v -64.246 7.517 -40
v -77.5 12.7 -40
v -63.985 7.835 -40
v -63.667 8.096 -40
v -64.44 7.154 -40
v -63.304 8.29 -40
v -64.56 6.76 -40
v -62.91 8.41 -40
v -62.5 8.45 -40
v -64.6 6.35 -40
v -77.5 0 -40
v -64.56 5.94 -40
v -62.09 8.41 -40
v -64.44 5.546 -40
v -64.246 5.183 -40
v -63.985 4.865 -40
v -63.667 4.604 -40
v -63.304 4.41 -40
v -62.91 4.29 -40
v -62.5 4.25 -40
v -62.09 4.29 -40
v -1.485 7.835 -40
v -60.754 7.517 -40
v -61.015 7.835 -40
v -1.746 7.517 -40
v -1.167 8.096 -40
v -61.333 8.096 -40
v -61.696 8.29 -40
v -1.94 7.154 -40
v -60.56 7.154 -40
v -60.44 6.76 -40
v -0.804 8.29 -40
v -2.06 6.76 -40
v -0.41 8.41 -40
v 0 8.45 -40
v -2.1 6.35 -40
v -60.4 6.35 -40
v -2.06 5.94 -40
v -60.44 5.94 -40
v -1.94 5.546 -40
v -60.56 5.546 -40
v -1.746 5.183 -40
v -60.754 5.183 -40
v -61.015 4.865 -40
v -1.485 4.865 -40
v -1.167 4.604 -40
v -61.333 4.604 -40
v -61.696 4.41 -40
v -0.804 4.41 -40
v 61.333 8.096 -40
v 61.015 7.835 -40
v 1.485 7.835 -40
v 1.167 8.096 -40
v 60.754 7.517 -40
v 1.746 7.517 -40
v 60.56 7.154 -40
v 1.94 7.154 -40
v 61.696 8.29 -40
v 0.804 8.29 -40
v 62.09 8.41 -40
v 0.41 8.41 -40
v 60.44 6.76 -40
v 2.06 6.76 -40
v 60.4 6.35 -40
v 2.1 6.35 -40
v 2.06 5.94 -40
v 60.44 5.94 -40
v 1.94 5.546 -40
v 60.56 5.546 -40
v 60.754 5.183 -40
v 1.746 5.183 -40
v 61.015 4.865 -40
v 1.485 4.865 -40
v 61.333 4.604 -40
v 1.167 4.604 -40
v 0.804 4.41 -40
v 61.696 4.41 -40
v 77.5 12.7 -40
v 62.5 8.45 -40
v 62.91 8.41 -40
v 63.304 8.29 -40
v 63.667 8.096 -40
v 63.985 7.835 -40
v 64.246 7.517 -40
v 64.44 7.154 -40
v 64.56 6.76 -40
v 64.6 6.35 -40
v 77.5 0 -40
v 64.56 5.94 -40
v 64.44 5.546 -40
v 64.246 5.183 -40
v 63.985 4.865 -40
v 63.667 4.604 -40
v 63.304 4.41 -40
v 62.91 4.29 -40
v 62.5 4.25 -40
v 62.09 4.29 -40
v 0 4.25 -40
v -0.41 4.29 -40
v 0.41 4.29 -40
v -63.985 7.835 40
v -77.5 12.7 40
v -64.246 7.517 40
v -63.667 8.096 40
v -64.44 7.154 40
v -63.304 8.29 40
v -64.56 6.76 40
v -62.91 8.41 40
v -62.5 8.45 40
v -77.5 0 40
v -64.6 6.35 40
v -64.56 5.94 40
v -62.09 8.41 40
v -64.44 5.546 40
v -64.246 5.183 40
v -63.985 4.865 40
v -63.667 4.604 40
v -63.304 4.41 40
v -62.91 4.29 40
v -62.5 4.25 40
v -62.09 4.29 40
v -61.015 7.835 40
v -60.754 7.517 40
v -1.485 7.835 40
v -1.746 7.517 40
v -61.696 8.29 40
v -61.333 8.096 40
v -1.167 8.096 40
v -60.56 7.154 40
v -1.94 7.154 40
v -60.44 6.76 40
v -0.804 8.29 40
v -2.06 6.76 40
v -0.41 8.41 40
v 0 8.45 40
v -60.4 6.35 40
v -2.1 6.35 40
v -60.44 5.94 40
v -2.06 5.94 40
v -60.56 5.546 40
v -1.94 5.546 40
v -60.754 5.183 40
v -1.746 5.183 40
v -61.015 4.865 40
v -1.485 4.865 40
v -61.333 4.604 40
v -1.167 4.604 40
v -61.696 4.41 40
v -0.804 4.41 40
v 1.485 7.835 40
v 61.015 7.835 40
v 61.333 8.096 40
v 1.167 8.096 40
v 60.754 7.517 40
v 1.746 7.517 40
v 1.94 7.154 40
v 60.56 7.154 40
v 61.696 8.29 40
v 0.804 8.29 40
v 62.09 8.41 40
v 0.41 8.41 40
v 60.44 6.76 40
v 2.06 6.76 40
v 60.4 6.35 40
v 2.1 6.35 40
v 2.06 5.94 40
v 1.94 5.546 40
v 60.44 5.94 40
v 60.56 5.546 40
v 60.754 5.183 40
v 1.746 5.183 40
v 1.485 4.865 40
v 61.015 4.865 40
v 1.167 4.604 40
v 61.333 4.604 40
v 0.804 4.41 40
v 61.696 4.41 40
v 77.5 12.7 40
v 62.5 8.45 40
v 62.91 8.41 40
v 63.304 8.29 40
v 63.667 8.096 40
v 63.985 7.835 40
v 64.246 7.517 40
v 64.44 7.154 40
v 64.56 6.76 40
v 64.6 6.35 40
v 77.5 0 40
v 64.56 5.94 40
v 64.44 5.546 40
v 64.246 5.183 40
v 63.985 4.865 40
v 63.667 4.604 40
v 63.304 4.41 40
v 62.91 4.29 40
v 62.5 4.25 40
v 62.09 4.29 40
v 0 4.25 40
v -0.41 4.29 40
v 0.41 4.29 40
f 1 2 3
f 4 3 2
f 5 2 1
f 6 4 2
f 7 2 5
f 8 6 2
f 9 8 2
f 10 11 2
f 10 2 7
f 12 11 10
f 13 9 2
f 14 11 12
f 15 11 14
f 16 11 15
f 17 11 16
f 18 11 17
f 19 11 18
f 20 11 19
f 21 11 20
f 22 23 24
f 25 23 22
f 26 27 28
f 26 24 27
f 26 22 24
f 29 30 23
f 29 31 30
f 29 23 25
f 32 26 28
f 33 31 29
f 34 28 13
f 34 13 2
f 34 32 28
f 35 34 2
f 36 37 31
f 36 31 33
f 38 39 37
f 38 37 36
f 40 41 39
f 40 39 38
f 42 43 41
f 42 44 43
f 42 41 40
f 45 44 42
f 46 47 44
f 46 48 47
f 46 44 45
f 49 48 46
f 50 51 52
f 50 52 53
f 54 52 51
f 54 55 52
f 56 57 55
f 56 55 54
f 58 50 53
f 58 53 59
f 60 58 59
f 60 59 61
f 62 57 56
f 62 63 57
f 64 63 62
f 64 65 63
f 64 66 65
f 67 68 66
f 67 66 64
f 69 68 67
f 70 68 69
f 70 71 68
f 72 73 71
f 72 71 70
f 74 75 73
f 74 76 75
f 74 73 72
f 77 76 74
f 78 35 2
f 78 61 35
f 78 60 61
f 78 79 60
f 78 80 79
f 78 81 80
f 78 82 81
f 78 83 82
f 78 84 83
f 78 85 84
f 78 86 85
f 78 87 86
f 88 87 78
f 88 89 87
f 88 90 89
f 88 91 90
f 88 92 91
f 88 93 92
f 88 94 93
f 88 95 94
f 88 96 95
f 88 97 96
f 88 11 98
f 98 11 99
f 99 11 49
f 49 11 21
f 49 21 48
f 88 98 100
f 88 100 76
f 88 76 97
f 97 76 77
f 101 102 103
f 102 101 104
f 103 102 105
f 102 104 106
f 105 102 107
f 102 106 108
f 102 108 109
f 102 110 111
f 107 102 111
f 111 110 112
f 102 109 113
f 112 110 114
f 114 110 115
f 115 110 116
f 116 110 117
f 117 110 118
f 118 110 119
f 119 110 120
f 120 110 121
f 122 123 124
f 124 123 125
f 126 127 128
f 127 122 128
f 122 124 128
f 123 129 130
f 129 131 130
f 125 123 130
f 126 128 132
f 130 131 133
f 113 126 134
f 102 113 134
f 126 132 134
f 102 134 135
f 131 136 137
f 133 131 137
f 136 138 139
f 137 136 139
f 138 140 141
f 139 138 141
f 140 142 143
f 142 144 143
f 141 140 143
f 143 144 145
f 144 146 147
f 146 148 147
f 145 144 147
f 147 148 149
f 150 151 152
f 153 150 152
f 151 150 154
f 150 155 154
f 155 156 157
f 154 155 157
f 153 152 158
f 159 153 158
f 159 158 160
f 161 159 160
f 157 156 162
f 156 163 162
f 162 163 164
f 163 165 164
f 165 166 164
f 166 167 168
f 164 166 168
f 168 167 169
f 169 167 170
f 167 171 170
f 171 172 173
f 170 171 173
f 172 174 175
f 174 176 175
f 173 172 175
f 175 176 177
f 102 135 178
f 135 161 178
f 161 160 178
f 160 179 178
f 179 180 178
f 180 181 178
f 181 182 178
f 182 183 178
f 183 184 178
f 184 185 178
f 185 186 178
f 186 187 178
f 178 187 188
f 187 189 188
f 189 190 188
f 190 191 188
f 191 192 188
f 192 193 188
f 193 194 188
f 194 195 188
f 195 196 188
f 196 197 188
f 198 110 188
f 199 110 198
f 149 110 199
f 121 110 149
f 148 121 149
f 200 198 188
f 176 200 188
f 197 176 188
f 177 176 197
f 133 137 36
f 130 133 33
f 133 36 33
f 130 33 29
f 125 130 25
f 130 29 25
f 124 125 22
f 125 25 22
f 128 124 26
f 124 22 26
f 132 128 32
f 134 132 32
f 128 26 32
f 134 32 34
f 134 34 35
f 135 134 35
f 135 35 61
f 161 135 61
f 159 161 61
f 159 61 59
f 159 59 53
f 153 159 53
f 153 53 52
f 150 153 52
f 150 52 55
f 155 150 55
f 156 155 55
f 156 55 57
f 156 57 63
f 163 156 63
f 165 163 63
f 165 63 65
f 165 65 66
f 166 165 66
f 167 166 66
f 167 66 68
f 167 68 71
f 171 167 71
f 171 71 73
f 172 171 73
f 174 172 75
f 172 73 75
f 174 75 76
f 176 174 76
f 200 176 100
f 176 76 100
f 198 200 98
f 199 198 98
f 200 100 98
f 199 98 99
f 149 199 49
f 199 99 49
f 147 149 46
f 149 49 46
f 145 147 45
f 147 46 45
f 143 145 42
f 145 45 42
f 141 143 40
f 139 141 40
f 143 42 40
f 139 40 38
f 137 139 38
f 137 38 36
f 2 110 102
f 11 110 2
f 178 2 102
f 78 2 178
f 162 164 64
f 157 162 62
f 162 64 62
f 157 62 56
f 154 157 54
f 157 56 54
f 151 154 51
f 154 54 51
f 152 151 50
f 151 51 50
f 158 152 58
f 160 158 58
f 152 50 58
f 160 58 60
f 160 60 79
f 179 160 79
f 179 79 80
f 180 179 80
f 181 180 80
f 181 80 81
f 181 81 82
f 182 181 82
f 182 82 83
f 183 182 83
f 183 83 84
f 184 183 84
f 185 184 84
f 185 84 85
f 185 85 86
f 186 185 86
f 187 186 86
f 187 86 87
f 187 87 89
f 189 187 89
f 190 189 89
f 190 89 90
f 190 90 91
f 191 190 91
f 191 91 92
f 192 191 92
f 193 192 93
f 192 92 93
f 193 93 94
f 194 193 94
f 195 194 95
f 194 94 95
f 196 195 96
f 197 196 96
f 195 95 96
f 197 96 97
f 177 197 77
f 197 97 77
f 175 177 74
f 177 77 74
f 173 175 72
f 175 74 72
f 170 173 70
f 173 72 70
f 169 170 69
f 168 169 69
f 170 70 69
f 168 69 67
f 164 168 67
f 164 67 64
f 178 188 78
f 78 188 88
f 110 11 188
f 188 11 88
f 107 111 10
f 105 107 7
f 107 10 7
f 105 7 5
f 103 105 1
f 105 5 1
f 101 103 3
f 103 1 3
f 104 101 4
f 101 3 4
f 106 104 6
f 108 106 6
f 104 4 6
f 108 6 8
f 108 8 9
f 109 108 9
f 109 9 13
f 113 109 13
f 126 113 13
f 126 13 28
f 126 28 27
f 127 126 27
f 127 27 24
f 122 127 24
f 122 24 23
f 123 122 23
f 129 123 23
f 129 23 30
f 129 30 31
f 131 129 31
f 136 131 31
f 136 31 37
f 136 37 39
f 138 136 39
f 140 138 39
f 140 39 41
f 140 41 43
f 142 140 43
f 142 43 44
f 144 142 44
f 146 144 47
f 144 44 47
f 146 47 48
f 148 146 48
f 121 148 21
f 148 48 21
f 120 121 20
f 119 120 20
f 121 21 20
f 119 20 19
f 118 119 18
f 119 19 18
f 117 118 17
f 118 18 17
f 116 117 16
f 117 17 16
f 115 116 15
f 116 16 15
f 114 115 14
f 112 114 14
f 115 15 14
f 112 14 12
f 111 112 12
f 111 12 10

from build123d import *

# Parameters (mm, degrees)
SKETCH1_W                   = 155
SKETCH1_H                   = 80
BOSS_EXTRUDE1_DEPTH         = 12.7
TAP_DRILL_FOR_M5X0_8_TAP1_D = 4.2


with BuildPart() as part:
    # Sketch1 → Boss-Extrude1 (new body)
    with BuildSketch(Plane(origin=(0, 0, 0), x_dir=(1, 0, 0), z_dir=(0, 1, 0))):
        Rectangle(SKETCH1_W, SKETCH1_H)
    extrude(amount=BOSS_EXTRUDE1_DEPTH)

    # Tap Drill for M5x0.8 Tap1 (through all)
    with Locations(Plane.XY.offset(40)):
        with Locations((-62.5, 6.35), (0, 6.35), (62.5, 6.35)):
            Hole(TAP_DRILL_FOR_M5X0_8_TAP1_D / 2)


solid = part.part
